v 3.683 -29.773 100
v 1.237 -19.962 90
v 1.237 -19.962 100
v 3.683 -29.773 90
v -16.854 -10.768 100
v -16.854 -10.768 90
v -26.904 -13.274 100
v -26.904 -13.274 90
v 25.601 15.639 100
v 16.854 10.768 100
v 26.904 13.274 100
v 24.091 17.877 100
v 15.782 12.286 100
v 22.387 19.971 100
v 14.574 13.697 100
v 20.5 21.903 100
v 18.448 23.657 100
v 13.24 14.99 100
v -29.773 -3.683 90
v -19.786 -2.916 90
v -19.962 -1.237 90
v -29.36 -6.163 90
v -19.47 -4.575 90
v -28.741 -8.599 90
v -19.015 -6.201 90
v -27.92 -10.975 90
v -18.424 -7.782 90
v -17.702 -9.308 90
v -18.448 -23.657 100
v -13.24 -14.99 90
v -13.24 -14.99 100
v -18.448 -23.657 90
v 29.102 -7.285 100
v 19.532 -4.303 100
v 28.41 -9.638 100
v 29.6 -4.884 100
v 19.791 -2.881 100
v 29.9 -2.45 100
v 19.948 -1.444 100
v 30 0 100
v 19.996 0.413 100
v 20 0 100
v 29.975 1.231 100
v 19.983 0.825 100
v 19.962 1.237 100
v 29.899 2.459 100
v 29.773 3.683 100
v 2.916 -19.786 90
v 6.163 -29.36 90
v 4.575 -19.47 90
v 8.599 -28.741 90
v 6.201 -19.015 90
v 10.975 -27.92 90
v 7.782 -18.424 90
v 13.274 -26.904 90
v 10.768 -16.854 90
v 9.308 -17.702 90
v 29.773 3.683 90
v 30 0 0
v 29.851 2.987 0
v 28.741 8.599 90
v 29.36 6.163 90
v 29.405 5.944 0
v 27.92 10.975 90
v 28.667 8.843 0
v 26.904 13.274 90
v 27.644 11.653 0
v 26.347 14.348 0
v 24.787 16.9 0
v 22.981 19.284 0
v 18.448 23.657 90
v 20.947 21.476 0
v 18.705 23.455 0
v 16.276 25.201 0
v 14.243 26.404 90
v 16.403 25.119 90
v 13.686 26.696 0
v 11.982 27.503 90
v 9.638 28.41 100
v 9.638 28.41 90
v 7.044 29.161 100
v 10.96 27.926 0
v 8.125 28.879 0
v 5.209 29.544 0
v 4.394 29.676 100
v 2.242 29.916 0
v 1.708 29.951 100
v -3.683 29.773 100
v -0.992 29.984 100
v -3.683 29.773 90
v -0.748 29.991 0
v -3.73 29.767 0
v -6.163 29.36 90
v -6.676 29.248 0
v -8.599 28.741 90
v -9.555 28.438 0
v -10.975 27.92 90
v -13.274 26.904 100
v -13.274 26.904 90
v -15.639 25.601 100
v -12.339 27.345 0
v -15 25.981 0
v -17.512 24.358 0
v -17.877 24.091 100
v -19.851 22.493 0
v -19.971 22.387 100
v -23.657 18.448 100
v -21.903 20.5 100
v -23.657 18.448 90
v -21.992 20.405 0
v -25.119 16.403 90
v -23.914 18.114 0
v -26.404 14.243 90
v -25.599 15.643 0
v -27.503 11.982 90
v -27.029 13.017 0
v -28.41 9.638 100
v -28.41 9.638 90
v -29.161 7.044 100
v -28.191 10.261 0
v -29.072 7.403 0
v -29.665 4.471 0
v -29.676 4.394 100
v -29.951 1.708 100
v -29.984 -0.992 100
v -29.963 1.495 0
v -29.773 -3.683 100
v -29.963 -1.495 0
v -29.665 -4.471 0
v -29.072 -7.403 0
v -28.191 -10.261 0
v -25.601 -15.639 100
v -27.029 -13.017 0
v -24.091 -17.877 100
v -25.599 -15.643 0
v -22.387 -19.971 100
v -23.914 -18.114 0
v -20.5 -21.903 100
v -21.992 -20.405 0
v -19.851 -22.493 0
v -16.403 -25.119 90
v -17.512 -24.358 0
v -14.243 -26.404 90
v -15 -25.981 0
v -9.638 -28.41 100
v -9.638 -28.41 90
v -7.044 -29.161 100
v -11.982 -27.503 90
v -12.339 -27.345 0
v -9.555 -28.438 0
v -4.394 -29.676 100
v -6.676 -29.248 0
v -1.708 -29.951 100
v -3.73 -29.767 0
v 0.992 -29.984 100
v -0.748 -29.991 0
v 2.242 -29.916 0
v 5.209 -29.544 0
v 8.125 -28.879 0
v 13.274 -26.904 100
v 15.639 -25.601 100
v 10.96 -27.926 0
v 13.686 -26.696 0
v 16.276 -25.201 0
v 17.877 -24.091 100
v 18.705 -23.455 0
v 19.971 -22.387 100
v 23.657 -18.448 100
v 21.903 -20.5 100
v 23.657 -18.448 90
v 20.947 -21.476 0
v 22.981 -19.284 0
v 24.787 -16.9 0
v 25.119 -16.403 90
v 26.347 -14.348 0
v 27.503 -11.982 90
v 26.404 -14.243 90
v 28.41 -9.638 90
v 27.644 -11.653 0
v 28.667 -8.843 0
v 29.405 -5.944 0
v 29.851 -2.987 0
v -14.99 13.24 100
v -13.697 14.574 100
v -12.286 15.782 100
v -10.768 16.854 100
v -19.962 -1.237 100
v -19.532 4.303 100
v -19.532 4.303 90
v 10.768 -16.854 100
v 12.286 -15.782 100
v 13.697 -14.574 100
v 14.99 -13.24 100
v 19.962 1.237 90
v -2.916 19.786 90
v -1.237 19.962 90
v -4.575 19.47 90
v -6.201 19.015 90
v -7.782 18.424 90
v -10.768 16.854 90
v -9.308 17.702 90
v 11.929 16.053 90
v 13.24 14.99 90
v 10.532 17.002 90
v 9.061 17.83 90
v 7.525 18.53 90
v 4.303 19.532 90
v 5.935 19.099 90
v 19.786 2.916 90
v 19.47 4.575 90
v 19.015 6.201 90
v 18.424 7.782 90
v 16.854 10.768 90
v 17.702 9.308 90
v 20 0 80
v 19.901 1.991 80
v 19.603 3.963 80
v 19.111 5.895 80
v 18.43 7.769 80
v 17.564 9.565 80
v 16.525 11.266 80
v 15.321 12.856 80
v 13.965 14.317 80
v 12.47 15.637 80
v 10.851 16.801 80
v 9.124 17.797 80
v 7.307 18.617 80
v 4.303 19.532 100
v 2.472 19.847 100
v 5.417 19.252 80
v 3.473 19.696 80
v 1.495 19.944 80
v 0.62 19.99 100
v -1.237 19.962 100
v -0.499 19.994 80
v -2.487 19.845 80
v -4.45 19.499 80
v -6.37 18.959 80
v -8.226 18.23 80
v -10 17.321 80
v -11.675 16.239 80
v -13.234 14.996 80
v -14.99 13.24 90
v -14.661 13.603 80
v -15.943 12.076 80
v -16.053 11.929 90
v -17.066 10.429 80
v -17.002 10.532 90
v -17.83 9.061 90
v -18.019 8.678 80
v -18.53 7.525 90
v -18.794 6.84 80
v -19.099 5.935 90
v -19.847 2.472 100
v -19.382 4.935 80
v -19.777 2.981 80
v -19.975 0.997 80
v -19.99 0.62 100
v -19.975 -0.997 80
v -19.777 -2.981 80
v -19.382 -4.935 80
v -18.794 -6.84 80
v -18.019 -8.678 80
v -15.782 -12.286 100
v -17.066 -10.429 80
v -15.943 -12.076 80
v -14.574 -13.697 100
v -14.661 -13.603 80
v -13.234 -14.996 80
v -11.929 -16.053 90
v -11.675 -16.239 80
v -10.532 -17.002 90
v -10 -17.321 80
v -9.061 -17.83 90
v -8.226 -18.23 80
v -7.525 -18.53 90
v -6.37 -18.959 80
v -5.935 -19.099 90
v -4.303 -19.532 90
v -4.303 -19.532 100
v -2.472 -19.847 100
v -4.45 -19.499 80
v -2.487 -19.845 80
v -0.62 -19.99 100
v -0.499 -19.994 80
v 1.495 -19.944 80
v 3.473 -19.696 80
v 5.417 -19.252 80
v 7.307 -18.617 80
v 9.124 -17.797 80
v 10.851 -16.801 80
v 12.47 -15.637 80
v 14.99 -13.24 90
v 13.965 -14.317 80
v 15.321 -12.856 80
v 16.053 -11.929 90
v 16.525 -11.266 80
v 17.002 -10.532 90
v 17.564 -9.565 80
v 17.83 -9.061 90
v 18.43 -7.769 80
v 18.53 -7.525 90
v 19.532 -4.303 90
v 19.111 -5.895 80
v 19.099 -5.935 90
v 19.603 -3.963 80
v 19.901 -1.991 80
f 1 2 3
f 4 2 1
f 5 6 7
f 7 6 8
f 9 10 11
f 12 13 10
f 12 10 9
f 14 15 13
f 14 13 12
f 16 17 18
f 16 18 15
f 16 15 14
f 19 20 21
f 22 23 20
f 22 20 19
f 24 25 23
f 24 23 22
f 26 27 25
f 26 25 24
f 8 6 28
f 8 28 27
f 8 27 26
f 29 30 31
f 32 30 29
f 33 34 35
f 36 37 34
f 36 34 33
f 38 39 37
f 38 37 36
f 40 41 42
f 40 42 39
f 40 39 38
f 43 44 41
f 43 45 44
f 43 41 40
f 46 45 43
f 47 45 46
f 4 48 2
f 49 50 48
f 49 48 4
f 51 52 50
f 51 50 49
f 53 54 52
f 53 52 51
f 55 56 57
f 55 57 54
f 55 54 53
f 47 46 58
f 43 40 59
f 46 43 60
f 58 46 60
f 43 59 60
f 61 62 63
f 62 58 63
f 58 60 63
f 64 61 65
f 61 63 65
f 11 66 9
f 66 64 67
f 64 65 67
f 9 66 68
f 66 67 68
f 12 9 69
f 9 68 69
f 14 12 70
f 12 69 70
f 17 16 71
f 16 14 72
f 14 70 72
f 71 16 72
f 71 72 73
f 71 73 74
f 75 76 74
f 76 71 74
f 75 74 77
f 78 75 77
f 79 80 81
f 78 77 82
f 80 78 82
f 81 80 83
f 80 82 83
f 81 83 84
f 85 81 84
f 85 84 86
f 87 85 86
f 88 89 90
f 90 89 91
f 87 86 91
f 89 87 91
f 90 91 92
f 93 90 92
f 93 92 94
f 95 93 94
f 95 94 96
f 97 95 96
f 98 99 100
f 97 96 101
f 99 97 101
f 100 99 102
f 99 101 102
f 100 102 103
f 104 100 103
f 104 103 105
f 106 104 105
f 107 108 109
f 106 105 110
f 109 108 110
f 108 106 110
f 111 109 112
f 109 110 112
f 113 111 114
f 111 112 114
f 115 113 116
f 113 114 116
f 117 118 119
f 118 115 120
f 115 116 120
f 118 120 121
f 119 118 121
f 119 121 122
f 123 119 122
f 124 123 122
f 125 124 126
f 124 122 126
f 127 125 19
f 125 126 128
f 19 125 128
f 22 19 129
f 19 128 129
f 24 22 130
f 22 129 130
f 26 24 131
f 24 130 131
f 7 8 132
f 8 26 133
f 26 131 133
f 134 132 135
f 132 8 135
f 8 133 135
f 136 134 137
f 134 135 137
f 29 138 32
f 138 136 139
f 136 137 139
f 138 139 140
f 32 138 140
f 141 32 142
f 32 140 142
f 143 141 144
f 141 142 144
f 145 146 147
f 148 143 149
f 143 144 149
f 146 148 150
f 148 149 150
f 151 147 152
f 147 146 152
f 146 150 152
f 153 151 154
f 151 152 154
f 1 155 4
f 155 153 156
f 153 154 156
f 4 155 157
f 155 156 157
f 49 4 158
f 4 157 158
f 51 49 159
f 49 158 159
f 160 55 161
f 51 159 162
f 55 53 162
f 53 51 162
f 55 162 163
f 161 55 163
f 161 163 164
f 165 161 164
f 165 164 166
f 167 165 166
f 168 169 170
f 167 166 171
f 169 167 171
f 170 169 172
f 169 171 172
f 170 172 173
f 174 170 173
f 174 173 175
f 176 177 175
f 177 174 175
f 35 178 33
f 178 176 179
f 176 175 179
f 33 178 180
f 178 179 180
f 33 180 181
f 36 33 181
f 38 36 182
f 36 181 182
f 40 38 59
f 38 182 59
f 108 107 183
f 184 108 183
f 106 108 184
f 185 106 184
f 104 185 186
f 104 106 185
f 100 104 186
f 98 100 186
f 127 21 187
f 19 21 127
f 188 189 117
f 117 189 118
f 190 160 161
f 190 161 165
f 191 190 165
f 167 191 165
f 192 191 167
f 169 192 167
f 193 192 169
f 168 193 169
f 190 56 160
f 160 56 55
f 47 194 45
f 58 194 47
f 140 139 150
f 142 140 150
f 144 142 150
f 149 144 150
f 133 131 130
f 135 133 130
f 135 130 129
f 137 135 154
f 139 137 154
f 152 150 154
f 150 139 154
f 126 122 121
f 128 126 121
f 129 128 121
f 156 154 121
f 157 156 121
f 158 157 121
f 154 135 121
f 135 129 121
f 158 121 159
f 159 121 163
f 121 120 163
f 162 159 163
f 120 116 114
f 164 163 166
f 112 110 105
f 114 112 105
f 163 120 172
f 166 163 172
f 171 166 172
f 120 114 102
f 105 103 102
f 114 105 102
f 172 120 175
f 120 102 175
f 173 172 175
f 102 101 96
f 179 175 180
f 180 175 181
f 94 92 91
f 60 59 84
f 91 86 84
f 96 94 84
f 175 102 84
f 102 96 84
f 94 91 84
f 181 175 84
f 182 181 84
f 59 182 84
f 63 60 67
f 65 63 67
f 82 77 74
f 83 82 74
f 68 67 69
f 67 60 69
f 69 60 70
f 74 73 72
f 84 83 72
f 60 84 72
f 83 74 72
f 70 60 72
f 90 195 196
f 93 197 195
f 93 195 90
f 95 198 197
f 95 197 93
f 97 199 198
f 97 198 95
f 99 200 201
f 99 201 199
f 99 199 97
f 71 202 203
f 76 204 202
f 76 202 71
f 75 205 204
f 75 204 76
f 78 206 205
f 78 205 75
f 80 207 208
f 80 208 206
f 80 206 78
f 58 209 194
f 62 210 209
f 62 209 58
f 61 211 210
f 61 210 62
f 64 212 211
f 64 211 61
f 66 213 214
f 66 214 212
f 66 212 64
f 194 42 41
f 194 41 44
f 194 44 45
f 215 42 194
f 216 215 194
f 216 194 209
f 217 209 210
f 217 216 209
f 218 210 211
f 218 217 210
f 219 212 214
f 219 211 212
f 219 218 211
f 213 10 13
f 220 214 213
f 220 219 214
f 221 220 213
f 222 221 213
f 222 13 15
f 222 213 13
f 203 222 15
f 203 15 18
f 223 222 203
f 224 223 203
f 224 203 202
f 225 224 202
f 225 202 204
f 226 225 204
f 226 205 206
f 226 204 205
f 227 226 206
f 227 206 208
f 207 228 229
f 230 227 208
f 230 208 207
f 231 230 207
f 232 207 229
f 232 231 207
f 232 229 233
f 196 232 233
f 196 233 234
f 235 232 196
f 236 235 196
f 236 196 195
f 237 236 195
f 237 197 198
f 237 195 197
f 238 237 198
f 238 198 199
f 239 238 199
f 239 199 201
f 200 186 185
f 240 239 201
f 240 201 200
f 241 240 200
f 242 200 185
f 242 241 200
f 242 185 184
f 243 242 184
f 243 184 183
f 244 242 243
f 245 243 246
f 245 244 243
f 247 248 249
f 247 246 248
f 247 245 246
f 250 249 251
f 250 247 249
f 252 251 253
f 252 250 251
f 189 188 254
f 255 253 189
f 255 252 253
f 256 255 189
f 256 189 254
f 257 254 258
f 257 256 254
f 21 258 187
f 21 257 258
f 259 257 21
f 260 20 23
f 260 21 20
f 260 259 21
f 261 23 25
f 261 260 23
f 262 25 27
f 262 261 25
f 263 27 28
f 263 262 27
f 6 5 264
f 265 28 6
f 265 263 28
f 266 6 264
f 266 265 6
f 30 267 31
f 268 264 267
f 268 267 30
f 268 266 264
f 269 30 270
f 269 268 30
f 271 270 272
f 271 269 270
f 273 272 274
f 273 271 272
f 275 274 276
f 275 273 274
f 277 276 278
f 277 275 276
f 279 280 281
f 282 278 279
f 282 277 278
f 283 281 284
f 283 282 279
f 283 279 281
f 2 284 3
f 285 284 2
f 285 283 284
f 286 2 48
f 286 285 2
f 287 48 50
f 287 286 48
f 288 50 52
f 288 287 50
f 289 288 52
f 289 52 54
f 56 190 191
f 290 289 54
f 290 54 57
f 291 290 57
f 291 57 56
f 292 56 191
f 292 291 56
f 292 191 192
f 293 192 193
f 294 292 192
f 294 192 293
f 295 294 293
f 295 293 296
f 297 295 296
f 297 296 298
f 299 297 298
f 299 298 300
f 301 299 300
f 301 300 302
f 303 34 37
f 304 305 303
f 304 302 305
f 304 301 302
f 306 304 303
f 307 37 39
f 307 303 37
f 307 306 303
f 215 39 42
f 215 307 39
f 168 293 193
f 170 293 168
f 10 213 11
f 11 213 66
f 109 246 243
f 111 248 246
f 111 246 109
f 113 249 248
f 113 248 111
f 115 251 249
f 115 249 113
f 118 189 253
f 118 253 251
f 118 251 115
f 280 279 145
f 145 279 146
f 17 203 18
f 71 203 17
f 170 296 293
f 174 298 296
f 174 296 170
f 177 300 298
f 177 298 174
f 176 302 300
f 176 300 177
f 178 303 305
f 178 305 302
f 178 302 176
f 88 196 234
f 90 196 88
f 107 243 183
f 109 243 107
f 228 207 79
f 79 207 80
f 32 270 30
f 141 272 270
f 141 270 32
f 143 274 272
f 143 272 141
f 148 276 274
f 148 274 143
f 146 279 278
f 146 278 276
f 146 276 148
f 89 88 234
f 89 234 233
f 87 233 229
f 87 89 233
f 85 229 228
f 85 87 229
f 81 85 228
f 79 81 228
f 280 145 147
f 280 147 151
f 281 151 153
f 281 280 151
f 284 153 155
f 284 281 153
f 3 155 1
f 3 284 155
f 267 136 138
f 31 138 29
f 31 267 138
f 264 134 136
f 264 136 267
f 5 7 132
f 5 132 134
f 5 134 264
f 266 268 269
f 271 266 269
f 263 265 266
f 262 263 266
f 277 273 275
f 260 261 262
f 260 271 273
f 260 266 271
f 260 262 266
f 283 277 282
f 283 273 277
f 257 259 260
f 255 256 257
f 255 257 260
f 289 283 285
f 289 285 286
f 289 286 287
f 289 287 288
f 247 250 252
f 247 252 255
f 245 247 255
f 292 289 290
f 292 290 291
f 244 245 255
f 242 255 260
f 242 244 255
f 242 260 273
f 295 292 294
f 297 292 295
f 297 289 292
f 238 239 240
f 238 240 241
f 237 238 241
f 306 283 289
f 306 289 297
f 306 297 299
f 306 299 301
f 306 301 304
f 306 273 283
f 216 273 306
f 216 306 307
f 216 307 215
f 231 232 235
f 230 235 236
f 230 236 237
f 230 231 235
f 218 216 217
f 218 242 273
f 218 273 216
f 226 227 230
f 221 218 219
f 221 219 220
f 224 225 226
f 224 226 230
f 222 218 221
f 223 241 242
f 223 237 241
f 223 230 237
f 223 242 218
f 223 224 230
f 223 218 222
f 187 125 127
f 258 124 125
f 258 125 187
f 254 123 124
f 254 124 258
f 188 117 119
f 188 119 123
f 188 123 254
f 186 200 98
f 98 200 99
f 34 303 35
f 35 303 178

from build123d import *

# Parameters (mm, degrees)
BOX_W               = 20
BOX_H               = 10
BOX_DEPTH           = 10
BOX_PLACEMENT_ANGLE = 14
ARRAY_COUNT         = 8
CYLINDER001_R       = 20
CYLINDER001_DEPTH   = 20
CYLINDER_R          = 30
CYLINDER_DEPTH      = 100


with BuildPart() as merlets:
    # Box → Box (new body)
    with BuildSketch(Plane.XY):
        with Locations((10, 5)):
            Rectangle(BOX_W, BOX_H)
    extrude(amount=BOX_DEPTH)


with BuildPart() as merlets_1:
    # Box placement: moved
    add(merlets.part.moved(Location((15, 0, 90))).rotate(Axis((15, 0, 90), (0, 0, 1)), BOX_PLACEMENT_ANGLE))

    # Array: merlets ×8 about axis
    array_axis = Axis((0, 0, 1), (0, 0, 1))


with BuildPart() as merlets_2:
    add(merlets_1.part)
    for i in range(1, ARRAY_COUNT):
        add(merlets_1.part.rotate(array_axis, i * 360 / ARRAY_COUNT))


with BuildPart() as cylinder001:
    # Cylinder001 → Cylinder001 (new body)
    with BuildSketch(Plane.XY.offset(80)):
        Circle(CYLINDER001_R)
    extrude(amount=CYLINDER001_DEPTH)


with BuildPart() as torre:
    # Cylinder → Cylinder (new body)
    with BuildSketch(Plane.XY):
        Circle(CYLINDER_R)
    extrude(amount=CYLINDER_DEPTH)

    # Cut: cut Cylinder001
    add(cylinder001.part, mode=Mode.SUBTRACT)

    # Cut001: cut merlets
    add(merlets_2.part, mode=Mode.SUBTRACT)


solid = torre.part
